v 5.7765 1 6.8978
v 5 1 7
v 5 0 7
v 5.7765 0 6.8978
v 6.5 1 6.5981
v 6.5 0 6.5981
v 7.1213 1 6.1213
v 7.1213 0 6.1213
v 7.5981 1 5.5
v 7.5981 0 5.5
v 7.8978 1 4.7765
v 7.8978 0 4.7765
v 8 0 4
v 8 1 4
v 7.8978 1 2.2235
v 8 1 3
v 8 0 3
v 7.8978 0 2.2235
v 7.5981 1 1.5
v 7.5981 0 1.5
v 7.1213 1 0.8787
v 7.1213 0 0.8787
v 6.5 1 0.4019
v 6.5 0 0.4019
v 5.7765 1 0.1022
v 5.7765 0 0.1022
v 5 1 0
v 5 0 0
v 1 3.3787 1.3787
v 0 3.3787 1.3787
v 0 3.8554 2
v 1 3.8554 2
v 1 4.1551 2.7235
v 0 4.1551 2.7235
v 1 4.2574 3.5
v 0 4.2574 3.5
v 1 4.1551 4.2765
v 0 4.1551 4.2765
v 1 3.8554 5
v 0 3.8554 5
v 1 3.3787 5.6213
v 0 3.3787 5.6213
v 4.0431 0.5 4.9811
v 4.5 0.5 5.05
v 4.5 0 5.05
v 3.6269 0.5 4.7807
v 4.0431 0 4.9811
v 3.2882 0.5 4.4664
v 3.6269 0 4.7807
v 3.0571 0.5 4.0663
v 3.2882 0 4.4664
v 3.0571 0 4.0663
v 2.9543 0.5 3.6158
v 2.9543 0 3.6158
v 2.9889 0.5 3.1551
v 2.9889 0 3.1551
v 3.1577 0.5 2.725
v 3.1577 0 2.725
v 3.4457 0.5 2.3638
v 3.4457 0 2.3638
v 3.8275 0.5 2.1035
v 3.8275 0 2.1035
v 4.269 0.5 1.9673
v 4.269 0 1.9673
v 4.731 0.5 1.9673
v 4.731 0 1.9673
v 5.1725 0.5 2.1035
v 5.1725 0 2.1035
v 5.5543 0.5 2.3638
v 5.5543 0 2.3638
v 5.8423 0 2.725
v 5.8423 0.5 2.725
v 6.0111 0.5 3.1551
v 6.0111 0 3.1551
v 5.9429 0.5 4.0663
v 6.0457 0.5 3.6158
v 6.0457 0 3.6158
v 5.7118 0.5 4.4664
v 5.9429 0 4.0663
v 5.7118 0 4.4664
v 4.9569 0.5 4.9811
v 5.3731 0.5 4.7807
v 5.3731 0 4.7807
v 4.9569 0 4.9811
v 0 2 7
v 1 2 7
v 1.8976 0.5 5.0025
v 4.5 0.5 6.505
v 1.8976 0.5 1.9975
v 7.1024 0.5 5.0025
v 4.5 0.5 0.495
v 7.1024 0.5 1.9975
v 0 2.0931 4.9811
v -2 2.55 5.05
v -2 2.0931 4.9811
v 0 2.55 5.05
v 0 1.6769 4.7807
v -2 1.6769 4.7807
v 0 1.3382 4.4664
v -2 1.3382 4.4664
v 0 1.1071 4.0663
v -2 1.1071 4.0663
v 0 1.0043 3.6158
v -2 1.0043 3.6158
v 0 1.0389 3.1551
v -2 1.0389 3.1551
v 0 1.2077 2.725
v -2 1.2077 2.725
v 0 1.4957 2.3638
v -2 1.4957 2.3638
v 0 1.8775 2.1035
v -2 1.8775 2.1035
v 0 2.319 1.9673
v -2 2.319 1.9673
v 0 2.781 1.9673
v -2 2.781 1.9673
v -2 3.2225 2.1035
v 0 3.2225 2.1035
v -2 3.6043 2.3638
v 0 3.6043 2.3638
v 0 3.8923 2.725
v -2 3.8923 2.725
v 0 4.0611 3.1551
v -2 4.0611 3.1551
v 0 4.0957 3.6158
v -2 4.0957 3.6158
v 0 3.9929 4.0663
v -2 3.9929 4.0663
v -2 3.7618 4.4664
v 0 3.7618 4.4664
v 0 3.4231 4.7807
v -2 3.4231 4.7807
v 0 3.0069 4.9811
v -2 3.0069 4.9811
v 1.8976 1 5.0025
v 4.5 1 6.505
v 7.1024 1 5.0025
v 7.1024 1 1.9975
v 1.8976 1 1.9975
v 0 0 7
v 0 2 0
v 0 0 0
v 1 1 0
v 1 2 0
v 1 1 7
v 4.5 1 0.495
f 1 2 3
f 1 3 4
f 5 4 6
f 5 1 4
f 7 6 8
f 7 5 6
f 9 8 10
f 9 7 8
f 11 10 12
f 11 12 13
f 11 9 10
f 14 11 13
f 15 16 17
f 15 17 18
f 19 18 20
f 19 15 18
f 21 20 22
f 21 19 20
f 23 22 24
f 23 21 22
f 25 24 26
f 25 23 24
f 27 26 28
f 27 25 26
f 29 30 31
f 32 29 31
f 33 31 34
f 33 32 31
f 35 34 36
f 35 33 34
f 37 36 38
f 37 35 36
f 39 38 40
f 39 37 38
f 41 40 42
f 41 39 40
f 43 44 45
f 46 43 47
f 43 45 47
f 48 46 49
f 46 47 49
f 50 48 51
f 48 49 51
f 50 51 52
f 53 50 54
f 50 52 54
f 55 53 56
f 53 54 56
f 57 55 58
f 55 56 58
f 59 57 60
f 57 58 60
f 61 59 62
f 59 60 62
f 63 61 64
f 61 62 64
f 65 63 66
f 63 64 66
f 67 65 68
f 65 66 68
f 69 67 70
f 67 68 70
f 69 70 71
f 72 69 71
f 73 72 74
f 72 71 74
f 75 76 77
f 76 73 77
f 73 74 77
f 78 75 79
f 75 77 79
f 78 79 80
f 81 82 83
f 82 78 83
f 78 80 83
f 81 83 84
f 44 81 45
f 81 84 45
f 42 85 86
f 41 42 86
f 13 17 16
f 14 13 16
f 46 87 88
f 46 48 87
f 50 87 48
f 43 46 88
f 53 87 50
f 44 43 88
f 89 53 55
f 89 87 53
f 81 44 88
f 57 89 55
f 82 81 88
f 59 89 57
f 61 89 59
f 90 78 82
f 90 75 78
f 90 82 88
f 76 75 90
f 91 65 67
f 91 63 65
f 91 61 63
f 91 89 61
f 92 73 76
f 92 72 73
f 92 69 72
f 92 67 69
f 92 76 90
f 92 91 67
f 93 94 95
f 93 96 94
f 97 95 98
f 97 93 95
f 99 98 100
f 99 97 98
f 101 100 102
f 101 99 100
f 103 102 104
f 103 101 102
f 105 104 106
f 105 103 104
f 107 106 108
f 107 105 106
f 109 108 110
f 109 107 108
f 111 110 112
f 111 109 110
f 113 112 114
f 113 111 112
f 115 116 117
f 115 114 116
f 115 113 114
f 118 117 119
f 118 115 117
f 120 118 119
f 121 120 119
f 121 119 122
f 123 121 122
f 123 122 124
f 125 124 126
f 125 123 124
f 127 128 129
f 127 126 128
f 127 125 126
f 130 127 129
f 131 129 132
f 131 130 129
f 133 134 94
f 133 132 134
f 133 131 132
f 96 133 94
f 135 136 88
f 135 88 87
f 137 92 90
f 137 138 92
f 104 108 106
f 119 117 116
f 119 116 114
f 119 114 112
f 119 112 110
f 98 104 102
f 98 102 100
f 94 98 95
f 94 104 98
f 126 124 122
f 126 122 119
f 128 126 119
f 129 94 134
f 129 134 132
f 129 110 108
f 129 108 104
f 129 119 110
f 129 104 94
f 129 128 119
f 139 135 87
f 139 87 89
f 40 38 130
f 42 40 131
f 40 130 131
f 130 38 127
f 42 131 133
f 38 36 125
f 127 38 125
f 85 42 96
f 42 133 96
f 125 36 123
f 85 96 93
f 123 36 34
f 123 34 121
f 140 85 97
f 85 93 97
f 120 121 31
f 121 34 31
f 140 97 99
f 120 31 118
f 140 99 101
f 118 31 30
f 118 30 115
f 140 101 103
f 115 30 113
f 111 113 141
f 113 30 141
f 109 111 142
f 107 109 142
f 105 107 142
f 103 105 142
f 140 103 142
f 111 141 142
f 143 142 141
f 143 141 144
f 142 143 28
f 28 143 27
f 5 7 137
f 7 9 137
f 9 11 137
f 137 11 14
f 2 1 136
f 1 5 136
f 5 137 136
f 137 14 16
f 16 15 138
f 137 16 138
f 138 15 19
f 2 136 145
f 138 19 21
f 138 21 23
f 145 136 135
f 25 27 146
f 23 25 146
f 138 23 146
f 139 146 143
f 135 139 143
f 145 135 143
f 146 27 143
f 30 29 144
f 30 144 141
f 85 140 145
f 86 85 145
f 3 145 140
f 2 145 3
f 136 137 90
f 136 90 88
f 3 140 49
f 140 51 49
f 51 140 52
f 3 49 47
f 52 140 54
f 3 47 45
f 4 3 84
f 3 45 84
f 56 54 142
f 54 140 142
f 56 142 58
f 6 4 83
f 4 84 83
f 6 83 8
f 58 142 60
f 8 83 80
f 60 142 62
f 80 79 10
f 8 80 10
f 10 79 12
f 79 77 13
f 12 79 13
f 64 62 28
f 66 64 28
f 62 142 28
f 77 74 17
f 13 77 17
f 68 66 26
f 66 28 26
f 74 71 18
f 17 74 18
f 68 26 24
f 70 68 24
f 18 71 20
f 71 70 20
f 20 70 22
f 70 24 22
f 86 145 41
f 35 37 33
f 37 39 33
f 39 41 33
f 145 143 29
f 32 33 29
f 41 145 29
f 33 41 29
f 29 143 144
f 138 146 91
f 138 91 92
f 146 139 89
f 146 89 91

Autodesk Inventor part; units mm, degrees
ref_plane "YZ Plane" through (0, 0, 0) normal (1, 0, 0) x (0, 1, 0)
ref_plane "XZ Plane" through (0, 0, 0) normal (0, 1, 0) x (-1, 0, 0)
ref_plane "XY Plane" through (0, 0, 0) normal (0, 0, 1) x (1, 0, 0)
sketch "Sketch1" plane through (0, 0, 0) normal (0, 0, 1) x (1, 0, 0)
  line L0 (0, 0) -> (8, 0)
  line L1 (8, 0) -> (8, 1)
  line L2 (8, 1) -> (1, 1)
  line L3 (1, 1) -> (1, 5)
  line L4 (1, 5) -> (0, 5)
  line L5 (0, 5) -> (0, 0)
  dimension "d0" = 8
  dimension "d1" = 5
  dimension "d2" = 1
  dimension "d8" = 1
extrude "Extrusion1" add sketch "Sketch1" along normal blind 7
sketch "Sketch2" plane through (0, 0, 0) normal (-1, 0, 0) x (0, 0, 1)
  circle A0 centre (3.5, 2.55) radius 1.55
  line L0 (0, 0) -> (7, 0) projected
  line L1 (7, 5) -> (7, 0) projected
  dimension "d5" = 3.1
  dimension "d6" = 2.55
  dimension "d7" = 3.5
extrude "Extrusion2" add sketch "Sketch2" along normal blind 2
sketch "Sketch3" plane through (1, 1, 0) normal (0, 1, 0) x (1, 0, 0)
  line L0 (7, 0) -> (7, -7) projected
  line L1 (7, -7) -> (0, -7) projected
  point P0 (-1, 0)
  point P1 (3.5, -3.5)
  point P2 (3.5, -7)
  dimension "d11" = 3.5
  dimension "d12" = 3.5
hole "Hole1" at (4.5, 1, 3.5) direction (0, -1, 0) diameter 3.1 end through all
sketch "Sketch4" plane through (1, 1, 0) normal (0, 1, 0) x (1, 0, 0)
  line L0 (3.5, -0.495) -> (6.1024, -1.9975)
  line L1 (6.1024, -1.9975) -> (6.1024, -5.0025)
  line L2 (6.1024, -5.0025) -> (3.5, -6.505)
  line L3 (3.5, -6.505) -> (0.8976, -5.0025)
  line L4 (0.8976, -5.0025) -> (0.8976, -1.9975)
  line L5 (0.8976, -1.9975) -> (3.5, -0.495)
  circle A0 centre (3.5, -3.5) radius 1.55 projected
  point P0 (-1, 0)
  dimension "d20" = 6.01
fillet "Fillet1" radius 3 2 edges at (8, 0.5, 0) (8, 0.5, 7)
extrude "Extrusion3" cut sketch "Sketch4" against normal blind 0.5
chamfer "Chamfer1" distance 3 angle 45 2 edges at (0.5, 5, 7) (0.5, 5, 0)
fillet "Fillet2" radius 3 2 edges at (0.5, 5, 4) (0.5, 5, 3)
properties part number "mocowanie_tofa_CPY1"
